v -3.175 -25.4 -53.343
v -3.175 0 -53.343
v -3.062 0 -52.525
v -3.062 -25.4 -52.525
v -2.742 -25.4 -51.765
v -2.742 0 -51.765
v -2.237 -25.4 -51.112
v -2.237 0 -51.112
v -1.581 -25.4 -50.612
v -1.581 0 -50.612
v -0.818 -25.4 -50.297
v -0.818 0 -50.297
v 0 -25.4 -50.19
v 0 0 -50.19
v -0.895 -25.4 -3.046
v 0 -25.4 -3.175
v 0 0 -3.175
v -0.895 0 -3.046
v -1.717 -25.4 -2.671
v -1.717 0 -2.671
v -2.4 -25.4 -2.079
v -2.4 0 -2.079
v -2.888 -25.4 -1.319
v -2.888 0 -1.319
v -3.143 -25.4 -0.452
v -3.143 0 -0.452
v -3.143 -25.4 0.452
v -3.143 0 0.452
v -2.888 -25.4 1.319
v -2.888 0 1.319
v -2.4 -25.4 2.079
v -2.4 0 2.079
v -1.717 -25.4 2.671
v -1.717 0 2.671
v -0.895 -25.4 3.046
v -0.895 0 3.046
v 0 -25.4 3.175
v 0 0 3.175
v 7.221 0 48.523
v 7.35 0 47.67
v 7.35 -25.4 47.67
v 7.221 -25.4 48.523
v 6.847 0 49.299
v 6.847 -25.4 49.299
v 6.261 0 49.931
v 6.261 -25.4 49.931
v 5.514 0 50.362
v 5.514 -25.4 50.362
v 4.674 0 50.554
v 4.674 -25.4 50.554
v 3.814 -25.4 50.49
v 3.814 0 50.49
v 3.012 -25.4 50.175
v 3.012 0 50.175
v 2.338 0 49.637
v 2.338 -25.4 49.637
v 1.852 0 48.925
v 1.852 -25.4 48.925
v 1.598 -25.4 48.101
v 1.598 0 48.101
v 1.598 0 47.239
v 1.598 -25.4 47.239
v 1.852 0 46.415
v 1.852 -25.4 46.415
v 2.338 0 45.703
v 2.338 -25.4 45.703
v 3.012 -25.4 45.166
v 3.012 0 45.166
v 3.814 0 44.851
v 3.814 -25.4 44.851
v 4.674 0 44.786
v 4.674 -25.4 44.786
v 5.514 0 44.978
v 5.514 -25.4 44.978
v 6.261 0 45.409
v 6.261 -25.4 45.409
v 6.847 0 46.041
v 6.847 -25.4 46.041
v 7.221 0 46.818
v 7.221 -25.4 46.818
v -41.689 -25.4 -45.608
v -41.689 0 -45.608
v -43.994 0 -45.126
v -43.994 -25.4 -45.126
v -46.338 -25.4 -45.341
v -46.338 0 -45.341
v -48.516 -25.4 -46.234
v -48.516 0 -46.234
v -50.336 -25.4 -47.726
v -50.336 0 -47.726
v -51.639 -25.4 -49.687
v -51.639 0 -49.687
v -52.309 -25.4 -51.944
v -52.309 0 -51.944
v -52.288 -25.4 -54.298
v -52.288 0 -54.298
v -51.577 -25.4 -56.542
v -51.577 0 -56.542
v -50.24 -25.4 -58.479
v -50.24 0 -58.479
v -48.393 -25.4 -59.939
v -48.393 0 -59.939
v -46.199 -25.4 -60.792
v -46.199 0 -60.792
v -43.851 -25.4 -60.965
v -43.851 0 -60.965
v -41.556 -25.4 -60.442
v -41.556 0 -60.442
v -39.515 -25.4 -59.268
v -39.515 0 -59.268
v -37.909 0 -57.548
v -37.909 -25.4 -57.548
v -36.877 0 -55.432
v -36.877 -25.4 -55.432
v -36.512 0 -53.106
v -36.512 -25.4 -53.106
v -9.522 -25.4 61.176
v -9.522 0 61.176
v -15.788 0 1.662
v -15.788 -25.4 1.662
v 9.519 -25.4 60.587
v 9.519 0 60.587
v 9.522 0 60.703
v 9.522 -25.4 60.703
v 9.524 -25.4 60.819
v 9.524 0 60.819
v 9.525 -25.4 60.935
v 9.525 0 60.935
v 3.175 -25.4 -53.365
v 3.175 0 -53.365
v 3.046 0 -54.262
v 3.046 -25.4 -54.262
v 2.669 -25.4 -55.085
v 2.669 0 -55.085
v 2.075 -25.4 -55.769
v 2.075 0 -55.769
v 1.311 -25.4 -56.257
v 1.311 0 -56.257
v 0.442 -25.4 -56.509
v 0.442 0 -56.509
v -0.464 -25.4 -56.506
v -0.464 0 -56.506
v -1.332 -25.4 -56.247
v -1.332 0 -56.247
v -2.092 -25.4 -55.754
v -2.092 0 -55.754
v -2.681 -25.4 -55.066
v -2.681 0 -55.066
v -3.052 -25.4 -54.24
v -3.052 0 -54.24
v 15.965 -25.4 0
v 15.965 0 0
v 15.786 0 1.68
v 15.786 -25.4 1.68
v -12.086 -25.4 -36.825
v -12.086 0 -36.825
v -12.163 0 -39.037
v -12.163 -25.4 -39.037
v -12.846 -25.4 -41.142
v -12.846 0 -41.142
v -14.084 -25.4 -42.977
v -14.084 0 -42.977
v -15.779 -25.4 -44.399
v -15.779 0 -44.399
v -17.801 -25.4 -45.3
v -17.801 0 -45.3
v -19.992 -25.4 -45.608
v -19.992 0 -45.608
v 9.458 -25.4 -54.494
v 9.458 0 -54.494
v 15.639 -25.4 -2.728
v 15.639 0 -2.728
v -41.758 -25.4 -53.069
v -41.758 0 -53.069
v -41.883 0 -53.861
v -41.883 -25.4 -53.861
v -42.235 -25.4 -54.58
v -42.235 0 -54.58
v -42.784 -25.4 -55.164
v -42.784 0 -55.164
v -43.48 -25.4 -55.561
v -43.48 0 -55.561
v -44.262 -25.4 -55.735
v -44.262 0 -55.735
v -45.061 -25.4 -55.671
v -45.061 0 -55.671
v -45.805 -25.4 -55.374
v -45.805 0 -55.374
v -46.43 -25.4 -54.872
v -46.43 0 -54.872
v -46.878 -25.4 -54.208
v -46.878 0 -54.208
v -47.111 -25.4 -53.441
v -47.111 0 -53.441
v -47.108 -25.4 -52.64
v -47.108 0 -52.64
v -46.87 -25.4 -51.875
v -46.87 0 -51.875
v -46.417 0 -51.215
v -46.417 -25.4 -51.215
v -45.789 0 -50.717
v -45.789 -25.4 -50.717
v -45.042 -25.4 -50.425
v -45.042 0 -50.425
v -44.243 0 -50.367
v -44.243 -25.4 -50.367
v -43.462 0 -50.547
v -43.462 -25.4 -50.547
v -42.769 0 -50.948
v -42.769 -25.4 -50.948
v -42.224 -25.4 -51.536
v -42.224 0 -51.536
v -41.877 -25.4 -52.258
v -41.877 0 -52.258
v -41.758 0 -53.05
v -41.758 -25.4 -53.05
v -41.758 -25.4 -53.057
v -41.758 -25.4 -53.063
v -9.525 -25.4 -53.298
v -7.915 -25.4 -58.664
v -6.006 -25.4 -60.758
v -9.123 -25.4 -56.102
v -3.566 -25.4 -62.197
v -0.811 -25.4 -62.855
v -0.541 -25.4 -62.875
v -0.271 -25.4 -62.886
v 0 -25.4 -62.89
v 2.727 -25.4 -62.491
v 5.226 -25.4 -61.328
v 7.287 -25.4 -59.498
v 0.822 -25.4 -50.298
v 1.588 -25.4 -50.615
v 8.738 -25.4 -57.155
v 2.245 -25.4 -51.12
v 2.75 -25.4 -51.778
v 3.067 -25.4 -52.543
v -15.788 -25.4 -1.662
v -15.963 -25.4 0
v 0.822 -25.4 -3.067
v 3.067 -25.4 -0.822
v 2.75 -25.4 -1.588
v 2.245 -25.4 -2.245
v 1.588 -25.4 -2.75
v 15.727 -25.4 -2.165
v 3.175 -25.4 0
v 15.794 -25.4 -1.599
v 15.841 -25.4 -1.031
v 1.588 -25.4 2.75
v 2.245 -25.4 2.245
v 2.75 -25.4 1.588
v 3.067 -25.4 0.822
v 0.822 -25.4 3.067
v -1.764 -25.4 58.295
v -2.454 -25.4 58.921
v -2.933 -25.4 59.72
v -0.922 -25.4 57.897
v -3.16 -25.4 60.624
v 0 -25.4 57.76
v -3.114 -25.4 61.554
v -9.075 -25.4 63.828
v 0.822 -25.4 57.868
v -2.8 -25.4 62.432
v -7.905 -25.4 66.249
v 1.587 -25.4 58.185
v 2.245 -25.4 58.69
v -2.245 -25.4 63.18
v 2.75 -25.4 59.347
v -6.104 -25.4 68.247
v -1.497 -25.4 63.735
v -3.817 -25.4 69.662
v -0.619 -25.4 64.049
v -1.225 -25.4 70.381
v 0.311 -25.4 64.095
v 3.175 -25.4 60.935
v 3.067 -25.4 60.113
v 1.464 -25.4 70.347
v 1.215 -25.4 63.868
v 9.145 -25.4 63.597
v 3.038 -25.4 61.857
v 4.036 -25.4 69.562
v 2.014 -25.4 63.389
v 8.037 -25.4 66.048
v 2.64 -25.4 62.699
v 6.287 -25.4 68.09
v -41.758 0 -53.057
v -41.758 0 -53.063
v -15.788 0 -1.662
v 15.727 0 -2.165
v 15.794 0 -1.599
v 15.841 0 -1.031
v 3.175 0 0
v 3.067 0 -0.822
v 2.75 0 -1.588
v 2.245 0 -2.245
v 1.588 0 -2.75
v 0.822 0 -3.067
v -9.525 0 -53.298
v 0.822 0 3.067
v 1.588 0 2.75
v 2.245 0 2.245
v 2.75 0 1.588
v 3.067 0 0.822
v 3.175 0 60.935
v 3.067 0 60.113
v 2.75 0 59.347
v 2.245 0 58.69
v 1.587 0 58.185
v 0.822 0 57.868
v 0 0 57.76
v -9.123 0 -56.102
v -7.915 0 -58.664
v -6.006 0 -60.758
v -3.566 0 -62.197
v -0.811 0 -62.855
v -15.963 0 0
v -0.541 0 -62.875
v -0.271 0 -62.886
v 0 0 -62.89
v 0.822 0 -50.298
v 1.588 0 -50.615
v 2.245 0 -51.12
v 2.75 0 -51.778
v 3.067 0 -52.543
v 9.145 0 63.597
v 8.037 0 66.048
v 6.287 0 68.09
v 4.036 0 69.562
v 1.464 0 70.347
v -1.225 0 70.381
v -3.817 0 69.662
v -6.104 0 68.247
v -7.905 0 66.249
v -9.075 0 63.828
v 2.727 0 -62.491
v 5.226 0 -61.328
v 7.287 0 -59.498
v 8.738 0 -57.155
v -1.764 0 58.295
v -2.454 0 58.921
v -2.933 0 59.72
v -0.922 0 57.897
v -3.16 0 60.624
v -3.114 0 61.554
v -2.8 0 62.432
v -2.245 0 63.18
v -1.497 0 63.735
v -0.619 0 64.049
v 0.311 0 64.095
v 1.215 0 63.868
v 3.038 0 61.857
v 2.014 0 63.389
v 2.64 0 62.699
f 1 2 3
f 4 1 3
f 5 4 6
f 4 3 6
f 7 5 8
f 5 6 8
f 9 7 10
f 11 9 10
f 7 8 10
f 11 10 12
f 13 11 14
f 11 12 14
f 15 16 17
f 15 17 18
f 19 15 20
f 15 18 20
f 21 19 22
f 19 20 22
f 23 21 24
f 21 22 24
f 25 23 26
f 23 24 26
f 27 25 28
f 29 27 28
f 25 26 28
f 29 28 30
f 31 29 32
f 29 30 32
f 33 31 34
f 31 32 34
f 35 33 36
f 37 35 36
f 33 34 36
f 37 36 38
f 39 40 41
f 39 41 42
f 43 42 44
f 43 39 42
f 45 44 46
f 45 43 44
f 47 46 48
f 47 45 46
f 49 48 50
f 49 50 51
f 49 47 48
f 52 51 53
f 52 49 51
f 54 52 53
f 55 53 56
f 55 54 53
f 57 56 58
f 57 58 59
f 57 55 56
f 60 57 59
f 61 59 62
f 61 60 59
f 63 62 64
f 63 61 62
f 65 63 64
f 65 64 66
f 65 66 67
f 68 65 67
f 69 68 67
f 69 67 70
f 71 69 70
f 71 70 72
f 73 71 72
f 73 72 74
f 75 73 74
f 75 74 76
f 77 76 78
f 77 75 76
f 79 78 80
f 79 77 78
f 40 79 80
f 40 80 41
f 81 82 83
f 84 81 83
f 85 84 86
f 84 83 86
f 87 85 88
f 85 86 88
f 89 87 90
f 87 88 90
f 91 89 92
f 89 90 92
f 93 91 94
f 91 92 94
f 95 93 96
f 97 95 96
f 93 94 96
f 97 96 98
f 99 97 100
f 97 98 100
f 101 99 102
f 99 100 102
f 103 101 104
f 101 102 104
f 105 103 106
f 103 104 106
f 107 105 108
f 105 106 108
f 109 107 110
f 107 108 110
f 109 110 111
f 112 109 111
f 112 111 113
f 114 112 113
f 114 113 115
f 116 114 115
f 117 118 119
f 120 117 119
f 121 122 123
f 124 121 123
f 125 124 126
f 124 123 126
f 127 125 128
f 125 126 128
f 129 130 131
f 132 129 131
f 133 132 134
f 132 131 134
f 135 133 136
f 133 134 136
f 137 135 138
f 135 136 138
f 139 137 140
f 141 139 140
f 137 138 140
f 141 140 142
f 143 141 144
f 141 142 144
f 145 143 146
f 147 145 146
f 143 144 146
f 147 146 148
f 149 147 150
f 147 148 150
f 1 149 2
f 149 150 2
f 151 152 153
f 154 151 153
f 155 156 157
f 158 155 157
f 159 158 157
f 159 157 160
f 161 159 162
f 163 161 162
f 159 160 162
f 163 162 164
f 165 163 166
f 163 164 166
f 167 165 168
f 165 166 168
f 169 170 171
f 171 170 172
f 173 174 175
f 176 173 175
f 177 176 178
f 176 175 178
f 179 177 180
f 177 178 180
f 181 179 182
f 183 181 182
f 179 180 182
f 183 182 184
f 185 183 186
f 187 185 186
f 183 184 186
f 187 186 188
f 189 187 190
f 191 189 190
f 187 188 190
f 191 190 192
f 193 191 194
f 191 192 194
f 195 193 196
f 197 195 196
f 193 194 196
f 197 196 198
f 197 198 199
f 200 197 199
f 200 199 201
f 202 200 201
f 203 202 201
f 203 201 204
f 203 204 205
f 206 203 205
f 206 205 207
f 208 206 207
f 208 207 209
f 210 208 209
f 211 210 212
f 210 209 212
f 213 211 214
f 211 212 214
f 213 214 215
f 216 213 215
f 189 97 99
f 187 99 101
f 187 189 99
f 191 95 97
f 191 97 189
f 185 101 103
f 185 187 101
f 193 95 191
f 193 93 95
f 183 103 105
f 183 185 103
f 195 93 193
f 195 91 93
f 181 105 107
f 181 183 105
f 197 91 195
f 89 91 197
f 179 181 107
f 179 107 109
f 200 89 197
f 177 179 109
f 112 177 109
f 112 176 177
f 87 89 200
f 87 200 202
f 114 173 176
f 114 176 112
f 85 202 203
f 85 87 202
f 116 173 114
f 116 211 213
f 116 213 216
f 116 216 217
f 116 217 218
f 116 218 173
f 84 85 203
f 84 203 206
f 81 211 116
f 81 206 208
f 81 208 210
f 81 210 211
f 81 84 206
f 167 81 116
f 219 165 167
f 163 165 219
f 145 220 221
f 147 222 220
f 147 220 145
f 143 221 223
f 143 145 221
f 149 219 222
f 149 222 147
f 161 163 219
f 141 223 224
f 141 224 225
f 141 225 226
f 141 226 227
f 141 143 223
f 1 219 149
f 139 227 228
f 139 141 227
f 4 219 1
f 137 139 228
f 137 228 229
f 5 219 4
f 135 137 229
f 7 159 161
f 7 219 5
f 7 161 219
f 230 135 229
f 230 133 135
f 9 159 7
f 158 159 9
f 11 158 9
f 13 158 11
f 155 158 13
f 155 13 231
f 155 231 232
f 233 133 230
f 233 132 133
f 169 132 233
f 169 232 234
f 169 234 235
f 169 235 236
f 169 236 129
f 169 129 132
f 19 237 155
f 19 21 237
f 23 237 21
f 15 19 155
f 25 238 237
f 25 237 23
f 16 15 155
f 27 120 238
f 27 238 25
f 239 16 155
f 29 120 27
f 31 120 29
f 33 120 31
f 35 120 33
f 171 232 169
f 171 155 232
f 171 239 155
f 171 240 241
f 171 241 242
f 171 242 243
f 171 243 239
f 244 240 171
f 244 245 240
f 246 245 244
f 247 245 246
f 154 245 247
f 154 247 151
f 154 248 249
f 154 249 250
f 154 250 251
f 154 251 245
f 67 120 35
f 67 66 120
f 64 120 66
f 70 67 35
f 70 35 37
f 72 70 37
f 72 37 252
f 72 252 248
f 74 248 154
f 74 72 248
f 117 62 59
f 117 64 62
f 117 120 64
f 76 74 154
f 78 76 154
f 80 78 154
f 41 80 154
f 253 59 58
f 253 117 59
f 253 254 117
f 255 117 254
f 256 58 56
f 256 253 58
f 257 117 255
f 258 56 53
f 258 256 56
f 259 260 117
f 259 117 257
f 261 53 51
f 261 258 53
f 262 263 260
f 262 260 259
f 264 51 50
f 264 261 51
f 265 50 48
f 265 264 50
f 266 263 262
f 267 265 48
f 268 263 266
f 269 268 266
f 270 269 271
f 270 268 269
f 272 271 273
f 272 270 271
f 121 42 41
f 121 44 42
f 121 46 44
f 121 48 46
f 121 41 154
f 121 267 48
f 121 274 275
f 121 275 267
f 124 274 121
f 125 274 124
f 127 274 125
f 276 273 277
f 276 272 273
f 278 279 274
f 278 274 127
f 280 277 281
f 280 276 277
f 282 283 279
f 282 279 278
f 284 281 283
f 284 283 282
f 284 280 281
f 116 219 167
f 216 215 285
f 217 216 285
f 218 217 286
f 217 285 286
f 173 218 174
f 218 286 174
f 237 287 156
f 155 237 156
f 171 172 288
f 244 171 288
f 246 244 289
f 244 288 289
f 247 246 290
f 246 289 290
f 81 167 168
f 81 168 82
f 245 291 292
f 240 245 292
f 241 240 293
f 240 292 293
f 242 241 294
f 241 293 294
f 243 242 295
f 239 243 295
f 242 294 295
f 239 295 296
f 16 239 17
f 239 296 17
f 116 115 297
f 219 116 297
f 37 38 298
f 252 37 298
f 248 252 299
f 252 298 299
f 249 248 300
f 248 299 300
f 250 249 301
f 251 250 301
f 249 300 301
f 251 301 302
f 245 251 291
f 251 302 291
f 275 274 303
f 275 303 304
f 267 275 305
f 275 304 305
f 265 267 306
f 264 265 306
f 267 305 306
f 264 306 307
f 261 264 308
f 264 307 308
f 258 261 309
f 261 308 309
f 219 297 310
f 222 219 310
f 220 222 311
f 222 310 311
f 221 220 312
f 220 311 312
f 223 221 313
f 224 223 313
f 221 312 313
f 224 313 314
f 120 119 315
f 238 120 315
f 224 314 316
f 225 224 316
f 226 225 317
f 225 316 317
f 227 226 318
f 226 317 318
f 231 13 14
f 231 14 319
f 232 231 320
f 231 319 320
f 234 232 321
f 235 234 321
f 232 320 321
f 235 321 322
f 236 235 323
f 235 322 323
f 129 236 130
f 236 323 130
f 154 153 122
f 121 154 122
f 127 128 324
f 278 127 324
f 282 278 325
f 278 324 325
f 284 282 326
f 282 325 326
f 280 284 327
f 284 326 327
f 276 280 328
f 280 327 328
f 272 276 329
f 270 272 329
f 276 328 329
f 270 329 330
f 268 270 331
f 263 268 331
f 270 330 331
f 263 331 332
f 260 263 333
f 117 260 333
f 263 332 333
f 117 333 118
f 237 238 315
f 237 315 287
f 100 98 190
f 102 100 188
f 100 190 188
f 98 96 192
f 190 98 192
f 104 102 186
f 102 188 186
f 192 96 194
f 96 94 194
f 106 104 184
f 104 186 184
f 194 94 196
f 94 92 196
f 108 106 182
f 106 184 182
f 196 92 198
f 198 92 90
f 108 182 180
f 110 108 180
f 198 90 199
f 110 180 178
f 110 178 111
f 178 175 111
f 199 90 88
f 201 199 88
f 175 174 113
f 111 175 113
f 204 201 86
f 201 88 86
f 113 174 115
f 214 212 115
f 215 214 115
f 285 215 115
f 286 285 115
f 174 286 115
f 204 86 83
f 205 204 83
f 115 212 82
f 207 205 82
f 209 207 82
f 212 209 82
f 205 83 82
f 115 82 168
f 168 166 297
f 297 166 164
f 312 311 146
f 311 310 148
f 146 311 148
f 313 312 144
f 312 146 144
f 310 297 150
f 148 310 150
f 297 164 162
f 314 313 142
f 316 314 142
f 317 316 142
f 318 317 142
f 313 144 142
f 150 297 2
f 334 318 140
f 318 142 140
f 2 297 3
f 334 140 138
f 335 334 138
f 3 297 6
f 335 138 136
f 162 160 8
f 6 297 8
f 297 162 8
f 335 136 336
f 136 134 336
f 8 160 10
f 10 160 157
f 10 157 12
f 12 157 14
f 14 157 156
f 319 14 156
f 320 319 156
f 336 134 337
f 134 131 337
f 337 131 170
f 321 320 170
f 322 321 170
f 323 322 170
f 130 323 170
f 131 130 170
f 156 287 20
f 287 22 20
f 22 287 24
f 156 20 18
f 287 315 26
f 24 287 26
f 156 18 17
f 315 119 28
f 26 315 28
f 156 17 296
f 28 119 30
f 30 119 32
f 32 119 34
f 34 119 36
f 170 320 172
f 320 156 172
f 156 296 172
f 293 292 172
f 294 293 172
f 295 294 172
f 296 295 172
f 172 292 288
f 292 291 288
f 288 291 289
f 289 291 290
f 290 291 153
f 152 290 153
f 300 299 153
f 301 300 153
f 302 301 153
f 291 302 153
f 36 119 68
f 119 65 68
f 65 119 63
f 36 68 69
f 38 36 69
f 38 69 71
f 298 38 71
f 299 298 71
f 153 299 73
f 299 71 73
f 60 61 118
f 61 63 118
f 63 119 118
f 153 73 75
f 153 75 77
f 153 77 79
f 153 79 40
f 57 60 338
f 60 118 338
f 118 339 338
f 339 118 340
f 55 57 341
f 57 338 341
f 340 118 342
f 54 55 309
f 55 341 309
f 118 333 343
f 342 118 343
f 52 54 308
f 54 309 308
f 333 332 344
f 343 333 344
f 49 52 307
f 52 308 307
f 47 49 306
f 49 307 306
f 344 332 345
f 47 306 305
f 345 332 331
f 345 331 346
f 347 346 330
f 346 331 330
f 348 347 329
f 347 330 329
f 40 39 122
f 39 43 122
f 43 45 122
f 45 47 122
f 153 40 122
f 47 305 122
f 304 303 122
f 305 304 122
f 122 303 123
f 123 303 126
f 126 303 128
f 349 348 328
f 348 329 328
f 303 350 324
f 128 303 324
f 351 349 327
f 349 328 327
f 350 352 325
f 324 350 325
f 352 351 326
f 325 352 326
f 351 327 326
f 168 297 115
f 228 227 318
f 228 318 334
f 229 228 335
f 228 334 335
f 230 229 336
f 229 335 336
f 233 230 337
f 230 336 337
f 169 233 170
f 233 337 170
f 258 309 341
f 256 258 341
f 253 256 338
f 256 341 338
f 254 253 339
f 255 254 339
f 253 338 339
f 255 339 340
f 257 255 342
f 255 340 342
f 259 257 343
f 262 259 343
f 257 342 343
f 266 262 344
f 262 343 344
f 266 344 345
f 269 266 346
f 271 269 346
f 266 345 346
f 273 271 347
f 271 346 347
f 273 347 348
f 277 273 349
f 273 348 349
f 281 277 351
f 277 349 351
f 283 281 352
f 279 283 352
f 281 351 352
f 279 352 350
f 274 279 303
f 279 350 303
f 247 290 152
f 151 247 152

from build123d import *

# Parameters (mm, degrees)
F0_R     = 2.8919986146
F1_DEPTH = 25.4


with BuildPart() as f1:
    # F0 (on Front) → F1 (new body)
    with BuildSketch(Plane.XZ):
        with BuildLine():
            ThreePointArc((-15.7877418604, -1.6621768702), (-15.875, -1.428e-07), (-15.7877418904, 1.6621765861))
            Line((-15.7877418904, 1.6621765861), (-15.9627403992, 0))
            Line((-15.9627403992, 0), (-15.7877418604, -1.6621768702))
        make_face()
        with BuildLine():
            ThreePointArc((15.6388934197, -2.7277532162), (15.7630306925, -1.8821499378), (15.8414795915, -1.0310913397))
            Line((15.8414795915, -1.0310913397), (15.6388934197, -2.7277532162))
        make_face()
        with BuildLine():
            ThreePointArc((15.7859080775, 1.6795032503), (15.8527113727, 0.8409323008), (15.875, 0))
            ThreePointArc((15.875, 0), (15.8666176849, -0.515818032), (15.8414795915, -1.0310913397))
            Line((15.8414795915, -1.0310913397), (15.9645947804, 0))
            Line((15.9645947804, 0), (15.7859080775, 1.6795032503))
        make_face()
        with BuildLine():
            ThreePointArc((0, -62.890048396), (6.3233352792, -60.4883240433), (9.4578184155, -54.4943383586))
            ThreePointArc((9.4578184155, -54.4943383586), (9.5081897701, -53.9306916548), (9.525, -53.365048396))
            ThreePointArc((9.525, -53.365048396), (6.7351920908, -46.6298563052), (0, -43.840048396))
            Line((0, -43.840048396), (0, -50.190048396))
            ThreePointArc((0, -50.190048396), (2.2450640303, -51.1199843657), (3.175, -53.365048396))
            ThreePointArc((3.175, -53.365048396), (-0.0112439351, -56.5400284863), (-3.1749203615, -53.3425606669))
            Line((-3.1749203615, -53.3425606669), (-9.5247610846, -53.2975852086))
            ThreePointArc((-9.5247610846, -53.2975852086), (-7.0387492113, -59.7823402345), (-0.8107396043, -62.8554818052))
            Line((-0.8107396043, -62.8554818052), (0, -62.890048396))
        make_face()
        with BuildLine():
            ThreePointArc((-41.6894964213, -45.607795813), (-50.980516261, -57.5603975821), (-36.5115841576, -53.1064395112))
            ThreePointArc((-36.5115841576, -53.1064395112), (-36.5114348356, -53.078330026), (-36.5113850614, -53.0502201884))
            ThreePointArc((-36.5113850614, -53.0502201884), (-37.9332671482, -48.5169399787), (-41.6894964213, -45.607795813))
        make_face()
        with BuildLine():
            ThreePointArc((-41.7578870296, -53.0502201884), (-41.7579039042, -53.0597500804), (-41.7579545278, -53.0692798529))
            ThreePointArc((-41.7579545278, -53.0692798529), (-47.1398662186, -53.0406902964), (-41.7578870296, -53.0502201884))
        make_face(mode=Mode.SUBTRACT)
        with BuildLine():
            ThreePointArc((-15.7877418904, 1.6621765861), (-10.6214069618, 11.7983617147), (0, 15.875))
            Line((0, 15.875), (0, 51.409951604))
            ThreePointArc((0, 51.409951604), (-6.8199440232, 54.2855915957), (-9.5219449967, 61.1761744869))
            Line((-9.5219449967, 61.1761744869), (-15.7877418904, 1.6621765861))
        make_face()
        with BuildLine():
            Line((9.4578184155, -54.4943383586), (15.6388934197, -2.7277532162))
            ThreePointArc((15.6388934197, -2.7277532162), (10.215491733, -12.1515165166), (0, -15.875))
            Line((0, -15.875), (0, -43.840048396))
            ThreePointArc((0, -43.840048396), (6.7351920908, -46.6298563052), (9.525, -53.365048396))
            ThreePointArc((9.525, -53.365048396), (9.5081897701, -53.9306916548), (9.4578184155, -54.4943383586))
        make_face()
        with BuildLine():
            ThreePointArc((0, 51.409951604), (6.6108879801, 54.077708345), (9.5186282495, 60.5866108977))
            ThreePointArc((9.5186282495, 60.5866108977), (9.5234069292, 60.7607521157), (9.525, 60.934951604))
            ThreePointArc((9.525, 60.934951604), (0.1206211137, 70.4591878226), (-9.5219449967, 61.1761744869))
            ThreePointArc((-9.5219449967, 61.1761744869), (-6.8199440232, 54.2855915957), (0, 51.409951604))
        make_face()
        with BuildLine():
            ThreePointArc((3.175, 60.934951604), (2.2450640303, 58.6898875738), (0, 57.759951604))
            ThreePointArc((0, 57.759951604), (-2.2450640303, 63.1800156343), (3.175, 60.934951604))
        make_face(mode=Mode.SUBTRACT)
        with BuildLine():
            Line((0, -50.190048396), (0, -43.840048396))
            ThreePointArc((0, -43.840048396), (-6.7112978678, -46.6060465518), (-9.5247610846, -53.2975852086))
            Line((-9.5247610846, -53.2975852086), (-3.1749203615, -53.3425606669))
            ThreePointArc((-3.1749203615, -53.3425606669), (-2.2370992893, -51.1120477812), (0, -50.190048396))
        make_face()
        with BuildLine():
            ThreePointArc((0, 15.875), (10.6149307794, 11.8041886443), (15.7859080775, 1.6795032503))
            Line((15.7859080775, 1.6795032503), (9.5186282495, 60.5866108977))
            ThreePointArc((9.5186282495, 60.5866108977), (6.6108879801, 54.077708345), (0, 51.409951604))
            Line((0, 51.409951604), (0, 15.875))
        make_face()
        with Locations((4.4577782974, 47.6701632142)):
            Circle(F0_R, mode=Mode.SUBTRACT)
        with BuildLine():
            Line((0, -43.840048396), (0, -15.875))
            ThreePointArc((0, -15.875), (-10.6214068556, -11.7983618103), (-15.7877418604, -1.6621768702))
            Line((-15.7877418604, -1.6621768702), (-12.0856847125, -36.8251776935))
            ThreePointArc((-12.0856847125, -36.8251776935), (-14.0835662669, -42.9767963876), (-19.9921858423, -45.607795813))
            Line((-19.9921858423, -45.607795813), (-41.6894964213, -45.607795813))
            ThreePointArc((-41.6894964213, -45.607795813), (-37.9332671482, -48.5169399787), (-36.5113850614, -53.0502201884))
            ThreePointArc((-36.5113850614, -53.0502201884), (-36.5114348356, -53.078330026), (-36.5115841576, -53.1064395112))
            Line((-36.5115841576, -53.1064395112), (-9.5247610846, -53.2975852086))
            ThreePointArc((-9.5247610846, -53.2975852086), (-6.7112978678, -46.6060465518), (0, -43.840048396))
        make_face()
        with BuildLine():
            Line((0, 3.175), (0, 15.875))
            ThreePointArc((0, 15.875), (-10.6214069618, 11.7983617147), (-15.7877418904, 1.6621765861))
            ThreePointArc((-15.7877418904, 1.6621765861), (-15.875, -1.428e-07), (-15.7877418604, -1.6621768702))
            ThreePointArc((-15.7877418604, -1.6621768702), (-10.6214068556, -11.7983618103), (0, -15.875))
            Line((0, -15.875), (0, -3.175))
            ThreePointArc((0, -3.175), (-3.175, 0), (0, 3.175))
        make_face()
        with BuildLine():
            ThreePointArc((15.8414795915, -1.0310913397), (15.8666176849, -0.515818032), (15.875, 0))
            ThreePointArc((15.875, 0), (15.8527113727, 0.8409323008), (15.7859080775, 1.6795032503))
            ThreePointArc((15.7859080775, 1.6795032503), (10.6149307794, 11.8041886443), (0, 15.875))
            Line((0, 15.875), (0, 3.175))
            ThreePointArc((0, 3.175), (2.2450640303, 2.2450640303), (3.175, 0))
            ThreePointArc((3.175, 0), (2.2450640303, -2.2450640303), (0, -3.175))
            Line((0, -3.175), (0, -15.875))
            ThreePointArc((0, -15.875), (10.215491733, -12.1515165166), (15.6388934197, -2.7277532162))
            Line((15.6388934197, -2.7277532162), (15.8414795915, -1.0310913397))
        make_face()
        with BuildLine():
            ThreePointArc((-0.8107396043, -62.8554818052), (-0.405738079, -62.8814028246), (0, -62.890048396))
            Line((0, -62.890048396), (-0.8107396043, -62.8554818052))
        make_face()
    extrude(amount=F1_DEPTH)


solid = f1.part
